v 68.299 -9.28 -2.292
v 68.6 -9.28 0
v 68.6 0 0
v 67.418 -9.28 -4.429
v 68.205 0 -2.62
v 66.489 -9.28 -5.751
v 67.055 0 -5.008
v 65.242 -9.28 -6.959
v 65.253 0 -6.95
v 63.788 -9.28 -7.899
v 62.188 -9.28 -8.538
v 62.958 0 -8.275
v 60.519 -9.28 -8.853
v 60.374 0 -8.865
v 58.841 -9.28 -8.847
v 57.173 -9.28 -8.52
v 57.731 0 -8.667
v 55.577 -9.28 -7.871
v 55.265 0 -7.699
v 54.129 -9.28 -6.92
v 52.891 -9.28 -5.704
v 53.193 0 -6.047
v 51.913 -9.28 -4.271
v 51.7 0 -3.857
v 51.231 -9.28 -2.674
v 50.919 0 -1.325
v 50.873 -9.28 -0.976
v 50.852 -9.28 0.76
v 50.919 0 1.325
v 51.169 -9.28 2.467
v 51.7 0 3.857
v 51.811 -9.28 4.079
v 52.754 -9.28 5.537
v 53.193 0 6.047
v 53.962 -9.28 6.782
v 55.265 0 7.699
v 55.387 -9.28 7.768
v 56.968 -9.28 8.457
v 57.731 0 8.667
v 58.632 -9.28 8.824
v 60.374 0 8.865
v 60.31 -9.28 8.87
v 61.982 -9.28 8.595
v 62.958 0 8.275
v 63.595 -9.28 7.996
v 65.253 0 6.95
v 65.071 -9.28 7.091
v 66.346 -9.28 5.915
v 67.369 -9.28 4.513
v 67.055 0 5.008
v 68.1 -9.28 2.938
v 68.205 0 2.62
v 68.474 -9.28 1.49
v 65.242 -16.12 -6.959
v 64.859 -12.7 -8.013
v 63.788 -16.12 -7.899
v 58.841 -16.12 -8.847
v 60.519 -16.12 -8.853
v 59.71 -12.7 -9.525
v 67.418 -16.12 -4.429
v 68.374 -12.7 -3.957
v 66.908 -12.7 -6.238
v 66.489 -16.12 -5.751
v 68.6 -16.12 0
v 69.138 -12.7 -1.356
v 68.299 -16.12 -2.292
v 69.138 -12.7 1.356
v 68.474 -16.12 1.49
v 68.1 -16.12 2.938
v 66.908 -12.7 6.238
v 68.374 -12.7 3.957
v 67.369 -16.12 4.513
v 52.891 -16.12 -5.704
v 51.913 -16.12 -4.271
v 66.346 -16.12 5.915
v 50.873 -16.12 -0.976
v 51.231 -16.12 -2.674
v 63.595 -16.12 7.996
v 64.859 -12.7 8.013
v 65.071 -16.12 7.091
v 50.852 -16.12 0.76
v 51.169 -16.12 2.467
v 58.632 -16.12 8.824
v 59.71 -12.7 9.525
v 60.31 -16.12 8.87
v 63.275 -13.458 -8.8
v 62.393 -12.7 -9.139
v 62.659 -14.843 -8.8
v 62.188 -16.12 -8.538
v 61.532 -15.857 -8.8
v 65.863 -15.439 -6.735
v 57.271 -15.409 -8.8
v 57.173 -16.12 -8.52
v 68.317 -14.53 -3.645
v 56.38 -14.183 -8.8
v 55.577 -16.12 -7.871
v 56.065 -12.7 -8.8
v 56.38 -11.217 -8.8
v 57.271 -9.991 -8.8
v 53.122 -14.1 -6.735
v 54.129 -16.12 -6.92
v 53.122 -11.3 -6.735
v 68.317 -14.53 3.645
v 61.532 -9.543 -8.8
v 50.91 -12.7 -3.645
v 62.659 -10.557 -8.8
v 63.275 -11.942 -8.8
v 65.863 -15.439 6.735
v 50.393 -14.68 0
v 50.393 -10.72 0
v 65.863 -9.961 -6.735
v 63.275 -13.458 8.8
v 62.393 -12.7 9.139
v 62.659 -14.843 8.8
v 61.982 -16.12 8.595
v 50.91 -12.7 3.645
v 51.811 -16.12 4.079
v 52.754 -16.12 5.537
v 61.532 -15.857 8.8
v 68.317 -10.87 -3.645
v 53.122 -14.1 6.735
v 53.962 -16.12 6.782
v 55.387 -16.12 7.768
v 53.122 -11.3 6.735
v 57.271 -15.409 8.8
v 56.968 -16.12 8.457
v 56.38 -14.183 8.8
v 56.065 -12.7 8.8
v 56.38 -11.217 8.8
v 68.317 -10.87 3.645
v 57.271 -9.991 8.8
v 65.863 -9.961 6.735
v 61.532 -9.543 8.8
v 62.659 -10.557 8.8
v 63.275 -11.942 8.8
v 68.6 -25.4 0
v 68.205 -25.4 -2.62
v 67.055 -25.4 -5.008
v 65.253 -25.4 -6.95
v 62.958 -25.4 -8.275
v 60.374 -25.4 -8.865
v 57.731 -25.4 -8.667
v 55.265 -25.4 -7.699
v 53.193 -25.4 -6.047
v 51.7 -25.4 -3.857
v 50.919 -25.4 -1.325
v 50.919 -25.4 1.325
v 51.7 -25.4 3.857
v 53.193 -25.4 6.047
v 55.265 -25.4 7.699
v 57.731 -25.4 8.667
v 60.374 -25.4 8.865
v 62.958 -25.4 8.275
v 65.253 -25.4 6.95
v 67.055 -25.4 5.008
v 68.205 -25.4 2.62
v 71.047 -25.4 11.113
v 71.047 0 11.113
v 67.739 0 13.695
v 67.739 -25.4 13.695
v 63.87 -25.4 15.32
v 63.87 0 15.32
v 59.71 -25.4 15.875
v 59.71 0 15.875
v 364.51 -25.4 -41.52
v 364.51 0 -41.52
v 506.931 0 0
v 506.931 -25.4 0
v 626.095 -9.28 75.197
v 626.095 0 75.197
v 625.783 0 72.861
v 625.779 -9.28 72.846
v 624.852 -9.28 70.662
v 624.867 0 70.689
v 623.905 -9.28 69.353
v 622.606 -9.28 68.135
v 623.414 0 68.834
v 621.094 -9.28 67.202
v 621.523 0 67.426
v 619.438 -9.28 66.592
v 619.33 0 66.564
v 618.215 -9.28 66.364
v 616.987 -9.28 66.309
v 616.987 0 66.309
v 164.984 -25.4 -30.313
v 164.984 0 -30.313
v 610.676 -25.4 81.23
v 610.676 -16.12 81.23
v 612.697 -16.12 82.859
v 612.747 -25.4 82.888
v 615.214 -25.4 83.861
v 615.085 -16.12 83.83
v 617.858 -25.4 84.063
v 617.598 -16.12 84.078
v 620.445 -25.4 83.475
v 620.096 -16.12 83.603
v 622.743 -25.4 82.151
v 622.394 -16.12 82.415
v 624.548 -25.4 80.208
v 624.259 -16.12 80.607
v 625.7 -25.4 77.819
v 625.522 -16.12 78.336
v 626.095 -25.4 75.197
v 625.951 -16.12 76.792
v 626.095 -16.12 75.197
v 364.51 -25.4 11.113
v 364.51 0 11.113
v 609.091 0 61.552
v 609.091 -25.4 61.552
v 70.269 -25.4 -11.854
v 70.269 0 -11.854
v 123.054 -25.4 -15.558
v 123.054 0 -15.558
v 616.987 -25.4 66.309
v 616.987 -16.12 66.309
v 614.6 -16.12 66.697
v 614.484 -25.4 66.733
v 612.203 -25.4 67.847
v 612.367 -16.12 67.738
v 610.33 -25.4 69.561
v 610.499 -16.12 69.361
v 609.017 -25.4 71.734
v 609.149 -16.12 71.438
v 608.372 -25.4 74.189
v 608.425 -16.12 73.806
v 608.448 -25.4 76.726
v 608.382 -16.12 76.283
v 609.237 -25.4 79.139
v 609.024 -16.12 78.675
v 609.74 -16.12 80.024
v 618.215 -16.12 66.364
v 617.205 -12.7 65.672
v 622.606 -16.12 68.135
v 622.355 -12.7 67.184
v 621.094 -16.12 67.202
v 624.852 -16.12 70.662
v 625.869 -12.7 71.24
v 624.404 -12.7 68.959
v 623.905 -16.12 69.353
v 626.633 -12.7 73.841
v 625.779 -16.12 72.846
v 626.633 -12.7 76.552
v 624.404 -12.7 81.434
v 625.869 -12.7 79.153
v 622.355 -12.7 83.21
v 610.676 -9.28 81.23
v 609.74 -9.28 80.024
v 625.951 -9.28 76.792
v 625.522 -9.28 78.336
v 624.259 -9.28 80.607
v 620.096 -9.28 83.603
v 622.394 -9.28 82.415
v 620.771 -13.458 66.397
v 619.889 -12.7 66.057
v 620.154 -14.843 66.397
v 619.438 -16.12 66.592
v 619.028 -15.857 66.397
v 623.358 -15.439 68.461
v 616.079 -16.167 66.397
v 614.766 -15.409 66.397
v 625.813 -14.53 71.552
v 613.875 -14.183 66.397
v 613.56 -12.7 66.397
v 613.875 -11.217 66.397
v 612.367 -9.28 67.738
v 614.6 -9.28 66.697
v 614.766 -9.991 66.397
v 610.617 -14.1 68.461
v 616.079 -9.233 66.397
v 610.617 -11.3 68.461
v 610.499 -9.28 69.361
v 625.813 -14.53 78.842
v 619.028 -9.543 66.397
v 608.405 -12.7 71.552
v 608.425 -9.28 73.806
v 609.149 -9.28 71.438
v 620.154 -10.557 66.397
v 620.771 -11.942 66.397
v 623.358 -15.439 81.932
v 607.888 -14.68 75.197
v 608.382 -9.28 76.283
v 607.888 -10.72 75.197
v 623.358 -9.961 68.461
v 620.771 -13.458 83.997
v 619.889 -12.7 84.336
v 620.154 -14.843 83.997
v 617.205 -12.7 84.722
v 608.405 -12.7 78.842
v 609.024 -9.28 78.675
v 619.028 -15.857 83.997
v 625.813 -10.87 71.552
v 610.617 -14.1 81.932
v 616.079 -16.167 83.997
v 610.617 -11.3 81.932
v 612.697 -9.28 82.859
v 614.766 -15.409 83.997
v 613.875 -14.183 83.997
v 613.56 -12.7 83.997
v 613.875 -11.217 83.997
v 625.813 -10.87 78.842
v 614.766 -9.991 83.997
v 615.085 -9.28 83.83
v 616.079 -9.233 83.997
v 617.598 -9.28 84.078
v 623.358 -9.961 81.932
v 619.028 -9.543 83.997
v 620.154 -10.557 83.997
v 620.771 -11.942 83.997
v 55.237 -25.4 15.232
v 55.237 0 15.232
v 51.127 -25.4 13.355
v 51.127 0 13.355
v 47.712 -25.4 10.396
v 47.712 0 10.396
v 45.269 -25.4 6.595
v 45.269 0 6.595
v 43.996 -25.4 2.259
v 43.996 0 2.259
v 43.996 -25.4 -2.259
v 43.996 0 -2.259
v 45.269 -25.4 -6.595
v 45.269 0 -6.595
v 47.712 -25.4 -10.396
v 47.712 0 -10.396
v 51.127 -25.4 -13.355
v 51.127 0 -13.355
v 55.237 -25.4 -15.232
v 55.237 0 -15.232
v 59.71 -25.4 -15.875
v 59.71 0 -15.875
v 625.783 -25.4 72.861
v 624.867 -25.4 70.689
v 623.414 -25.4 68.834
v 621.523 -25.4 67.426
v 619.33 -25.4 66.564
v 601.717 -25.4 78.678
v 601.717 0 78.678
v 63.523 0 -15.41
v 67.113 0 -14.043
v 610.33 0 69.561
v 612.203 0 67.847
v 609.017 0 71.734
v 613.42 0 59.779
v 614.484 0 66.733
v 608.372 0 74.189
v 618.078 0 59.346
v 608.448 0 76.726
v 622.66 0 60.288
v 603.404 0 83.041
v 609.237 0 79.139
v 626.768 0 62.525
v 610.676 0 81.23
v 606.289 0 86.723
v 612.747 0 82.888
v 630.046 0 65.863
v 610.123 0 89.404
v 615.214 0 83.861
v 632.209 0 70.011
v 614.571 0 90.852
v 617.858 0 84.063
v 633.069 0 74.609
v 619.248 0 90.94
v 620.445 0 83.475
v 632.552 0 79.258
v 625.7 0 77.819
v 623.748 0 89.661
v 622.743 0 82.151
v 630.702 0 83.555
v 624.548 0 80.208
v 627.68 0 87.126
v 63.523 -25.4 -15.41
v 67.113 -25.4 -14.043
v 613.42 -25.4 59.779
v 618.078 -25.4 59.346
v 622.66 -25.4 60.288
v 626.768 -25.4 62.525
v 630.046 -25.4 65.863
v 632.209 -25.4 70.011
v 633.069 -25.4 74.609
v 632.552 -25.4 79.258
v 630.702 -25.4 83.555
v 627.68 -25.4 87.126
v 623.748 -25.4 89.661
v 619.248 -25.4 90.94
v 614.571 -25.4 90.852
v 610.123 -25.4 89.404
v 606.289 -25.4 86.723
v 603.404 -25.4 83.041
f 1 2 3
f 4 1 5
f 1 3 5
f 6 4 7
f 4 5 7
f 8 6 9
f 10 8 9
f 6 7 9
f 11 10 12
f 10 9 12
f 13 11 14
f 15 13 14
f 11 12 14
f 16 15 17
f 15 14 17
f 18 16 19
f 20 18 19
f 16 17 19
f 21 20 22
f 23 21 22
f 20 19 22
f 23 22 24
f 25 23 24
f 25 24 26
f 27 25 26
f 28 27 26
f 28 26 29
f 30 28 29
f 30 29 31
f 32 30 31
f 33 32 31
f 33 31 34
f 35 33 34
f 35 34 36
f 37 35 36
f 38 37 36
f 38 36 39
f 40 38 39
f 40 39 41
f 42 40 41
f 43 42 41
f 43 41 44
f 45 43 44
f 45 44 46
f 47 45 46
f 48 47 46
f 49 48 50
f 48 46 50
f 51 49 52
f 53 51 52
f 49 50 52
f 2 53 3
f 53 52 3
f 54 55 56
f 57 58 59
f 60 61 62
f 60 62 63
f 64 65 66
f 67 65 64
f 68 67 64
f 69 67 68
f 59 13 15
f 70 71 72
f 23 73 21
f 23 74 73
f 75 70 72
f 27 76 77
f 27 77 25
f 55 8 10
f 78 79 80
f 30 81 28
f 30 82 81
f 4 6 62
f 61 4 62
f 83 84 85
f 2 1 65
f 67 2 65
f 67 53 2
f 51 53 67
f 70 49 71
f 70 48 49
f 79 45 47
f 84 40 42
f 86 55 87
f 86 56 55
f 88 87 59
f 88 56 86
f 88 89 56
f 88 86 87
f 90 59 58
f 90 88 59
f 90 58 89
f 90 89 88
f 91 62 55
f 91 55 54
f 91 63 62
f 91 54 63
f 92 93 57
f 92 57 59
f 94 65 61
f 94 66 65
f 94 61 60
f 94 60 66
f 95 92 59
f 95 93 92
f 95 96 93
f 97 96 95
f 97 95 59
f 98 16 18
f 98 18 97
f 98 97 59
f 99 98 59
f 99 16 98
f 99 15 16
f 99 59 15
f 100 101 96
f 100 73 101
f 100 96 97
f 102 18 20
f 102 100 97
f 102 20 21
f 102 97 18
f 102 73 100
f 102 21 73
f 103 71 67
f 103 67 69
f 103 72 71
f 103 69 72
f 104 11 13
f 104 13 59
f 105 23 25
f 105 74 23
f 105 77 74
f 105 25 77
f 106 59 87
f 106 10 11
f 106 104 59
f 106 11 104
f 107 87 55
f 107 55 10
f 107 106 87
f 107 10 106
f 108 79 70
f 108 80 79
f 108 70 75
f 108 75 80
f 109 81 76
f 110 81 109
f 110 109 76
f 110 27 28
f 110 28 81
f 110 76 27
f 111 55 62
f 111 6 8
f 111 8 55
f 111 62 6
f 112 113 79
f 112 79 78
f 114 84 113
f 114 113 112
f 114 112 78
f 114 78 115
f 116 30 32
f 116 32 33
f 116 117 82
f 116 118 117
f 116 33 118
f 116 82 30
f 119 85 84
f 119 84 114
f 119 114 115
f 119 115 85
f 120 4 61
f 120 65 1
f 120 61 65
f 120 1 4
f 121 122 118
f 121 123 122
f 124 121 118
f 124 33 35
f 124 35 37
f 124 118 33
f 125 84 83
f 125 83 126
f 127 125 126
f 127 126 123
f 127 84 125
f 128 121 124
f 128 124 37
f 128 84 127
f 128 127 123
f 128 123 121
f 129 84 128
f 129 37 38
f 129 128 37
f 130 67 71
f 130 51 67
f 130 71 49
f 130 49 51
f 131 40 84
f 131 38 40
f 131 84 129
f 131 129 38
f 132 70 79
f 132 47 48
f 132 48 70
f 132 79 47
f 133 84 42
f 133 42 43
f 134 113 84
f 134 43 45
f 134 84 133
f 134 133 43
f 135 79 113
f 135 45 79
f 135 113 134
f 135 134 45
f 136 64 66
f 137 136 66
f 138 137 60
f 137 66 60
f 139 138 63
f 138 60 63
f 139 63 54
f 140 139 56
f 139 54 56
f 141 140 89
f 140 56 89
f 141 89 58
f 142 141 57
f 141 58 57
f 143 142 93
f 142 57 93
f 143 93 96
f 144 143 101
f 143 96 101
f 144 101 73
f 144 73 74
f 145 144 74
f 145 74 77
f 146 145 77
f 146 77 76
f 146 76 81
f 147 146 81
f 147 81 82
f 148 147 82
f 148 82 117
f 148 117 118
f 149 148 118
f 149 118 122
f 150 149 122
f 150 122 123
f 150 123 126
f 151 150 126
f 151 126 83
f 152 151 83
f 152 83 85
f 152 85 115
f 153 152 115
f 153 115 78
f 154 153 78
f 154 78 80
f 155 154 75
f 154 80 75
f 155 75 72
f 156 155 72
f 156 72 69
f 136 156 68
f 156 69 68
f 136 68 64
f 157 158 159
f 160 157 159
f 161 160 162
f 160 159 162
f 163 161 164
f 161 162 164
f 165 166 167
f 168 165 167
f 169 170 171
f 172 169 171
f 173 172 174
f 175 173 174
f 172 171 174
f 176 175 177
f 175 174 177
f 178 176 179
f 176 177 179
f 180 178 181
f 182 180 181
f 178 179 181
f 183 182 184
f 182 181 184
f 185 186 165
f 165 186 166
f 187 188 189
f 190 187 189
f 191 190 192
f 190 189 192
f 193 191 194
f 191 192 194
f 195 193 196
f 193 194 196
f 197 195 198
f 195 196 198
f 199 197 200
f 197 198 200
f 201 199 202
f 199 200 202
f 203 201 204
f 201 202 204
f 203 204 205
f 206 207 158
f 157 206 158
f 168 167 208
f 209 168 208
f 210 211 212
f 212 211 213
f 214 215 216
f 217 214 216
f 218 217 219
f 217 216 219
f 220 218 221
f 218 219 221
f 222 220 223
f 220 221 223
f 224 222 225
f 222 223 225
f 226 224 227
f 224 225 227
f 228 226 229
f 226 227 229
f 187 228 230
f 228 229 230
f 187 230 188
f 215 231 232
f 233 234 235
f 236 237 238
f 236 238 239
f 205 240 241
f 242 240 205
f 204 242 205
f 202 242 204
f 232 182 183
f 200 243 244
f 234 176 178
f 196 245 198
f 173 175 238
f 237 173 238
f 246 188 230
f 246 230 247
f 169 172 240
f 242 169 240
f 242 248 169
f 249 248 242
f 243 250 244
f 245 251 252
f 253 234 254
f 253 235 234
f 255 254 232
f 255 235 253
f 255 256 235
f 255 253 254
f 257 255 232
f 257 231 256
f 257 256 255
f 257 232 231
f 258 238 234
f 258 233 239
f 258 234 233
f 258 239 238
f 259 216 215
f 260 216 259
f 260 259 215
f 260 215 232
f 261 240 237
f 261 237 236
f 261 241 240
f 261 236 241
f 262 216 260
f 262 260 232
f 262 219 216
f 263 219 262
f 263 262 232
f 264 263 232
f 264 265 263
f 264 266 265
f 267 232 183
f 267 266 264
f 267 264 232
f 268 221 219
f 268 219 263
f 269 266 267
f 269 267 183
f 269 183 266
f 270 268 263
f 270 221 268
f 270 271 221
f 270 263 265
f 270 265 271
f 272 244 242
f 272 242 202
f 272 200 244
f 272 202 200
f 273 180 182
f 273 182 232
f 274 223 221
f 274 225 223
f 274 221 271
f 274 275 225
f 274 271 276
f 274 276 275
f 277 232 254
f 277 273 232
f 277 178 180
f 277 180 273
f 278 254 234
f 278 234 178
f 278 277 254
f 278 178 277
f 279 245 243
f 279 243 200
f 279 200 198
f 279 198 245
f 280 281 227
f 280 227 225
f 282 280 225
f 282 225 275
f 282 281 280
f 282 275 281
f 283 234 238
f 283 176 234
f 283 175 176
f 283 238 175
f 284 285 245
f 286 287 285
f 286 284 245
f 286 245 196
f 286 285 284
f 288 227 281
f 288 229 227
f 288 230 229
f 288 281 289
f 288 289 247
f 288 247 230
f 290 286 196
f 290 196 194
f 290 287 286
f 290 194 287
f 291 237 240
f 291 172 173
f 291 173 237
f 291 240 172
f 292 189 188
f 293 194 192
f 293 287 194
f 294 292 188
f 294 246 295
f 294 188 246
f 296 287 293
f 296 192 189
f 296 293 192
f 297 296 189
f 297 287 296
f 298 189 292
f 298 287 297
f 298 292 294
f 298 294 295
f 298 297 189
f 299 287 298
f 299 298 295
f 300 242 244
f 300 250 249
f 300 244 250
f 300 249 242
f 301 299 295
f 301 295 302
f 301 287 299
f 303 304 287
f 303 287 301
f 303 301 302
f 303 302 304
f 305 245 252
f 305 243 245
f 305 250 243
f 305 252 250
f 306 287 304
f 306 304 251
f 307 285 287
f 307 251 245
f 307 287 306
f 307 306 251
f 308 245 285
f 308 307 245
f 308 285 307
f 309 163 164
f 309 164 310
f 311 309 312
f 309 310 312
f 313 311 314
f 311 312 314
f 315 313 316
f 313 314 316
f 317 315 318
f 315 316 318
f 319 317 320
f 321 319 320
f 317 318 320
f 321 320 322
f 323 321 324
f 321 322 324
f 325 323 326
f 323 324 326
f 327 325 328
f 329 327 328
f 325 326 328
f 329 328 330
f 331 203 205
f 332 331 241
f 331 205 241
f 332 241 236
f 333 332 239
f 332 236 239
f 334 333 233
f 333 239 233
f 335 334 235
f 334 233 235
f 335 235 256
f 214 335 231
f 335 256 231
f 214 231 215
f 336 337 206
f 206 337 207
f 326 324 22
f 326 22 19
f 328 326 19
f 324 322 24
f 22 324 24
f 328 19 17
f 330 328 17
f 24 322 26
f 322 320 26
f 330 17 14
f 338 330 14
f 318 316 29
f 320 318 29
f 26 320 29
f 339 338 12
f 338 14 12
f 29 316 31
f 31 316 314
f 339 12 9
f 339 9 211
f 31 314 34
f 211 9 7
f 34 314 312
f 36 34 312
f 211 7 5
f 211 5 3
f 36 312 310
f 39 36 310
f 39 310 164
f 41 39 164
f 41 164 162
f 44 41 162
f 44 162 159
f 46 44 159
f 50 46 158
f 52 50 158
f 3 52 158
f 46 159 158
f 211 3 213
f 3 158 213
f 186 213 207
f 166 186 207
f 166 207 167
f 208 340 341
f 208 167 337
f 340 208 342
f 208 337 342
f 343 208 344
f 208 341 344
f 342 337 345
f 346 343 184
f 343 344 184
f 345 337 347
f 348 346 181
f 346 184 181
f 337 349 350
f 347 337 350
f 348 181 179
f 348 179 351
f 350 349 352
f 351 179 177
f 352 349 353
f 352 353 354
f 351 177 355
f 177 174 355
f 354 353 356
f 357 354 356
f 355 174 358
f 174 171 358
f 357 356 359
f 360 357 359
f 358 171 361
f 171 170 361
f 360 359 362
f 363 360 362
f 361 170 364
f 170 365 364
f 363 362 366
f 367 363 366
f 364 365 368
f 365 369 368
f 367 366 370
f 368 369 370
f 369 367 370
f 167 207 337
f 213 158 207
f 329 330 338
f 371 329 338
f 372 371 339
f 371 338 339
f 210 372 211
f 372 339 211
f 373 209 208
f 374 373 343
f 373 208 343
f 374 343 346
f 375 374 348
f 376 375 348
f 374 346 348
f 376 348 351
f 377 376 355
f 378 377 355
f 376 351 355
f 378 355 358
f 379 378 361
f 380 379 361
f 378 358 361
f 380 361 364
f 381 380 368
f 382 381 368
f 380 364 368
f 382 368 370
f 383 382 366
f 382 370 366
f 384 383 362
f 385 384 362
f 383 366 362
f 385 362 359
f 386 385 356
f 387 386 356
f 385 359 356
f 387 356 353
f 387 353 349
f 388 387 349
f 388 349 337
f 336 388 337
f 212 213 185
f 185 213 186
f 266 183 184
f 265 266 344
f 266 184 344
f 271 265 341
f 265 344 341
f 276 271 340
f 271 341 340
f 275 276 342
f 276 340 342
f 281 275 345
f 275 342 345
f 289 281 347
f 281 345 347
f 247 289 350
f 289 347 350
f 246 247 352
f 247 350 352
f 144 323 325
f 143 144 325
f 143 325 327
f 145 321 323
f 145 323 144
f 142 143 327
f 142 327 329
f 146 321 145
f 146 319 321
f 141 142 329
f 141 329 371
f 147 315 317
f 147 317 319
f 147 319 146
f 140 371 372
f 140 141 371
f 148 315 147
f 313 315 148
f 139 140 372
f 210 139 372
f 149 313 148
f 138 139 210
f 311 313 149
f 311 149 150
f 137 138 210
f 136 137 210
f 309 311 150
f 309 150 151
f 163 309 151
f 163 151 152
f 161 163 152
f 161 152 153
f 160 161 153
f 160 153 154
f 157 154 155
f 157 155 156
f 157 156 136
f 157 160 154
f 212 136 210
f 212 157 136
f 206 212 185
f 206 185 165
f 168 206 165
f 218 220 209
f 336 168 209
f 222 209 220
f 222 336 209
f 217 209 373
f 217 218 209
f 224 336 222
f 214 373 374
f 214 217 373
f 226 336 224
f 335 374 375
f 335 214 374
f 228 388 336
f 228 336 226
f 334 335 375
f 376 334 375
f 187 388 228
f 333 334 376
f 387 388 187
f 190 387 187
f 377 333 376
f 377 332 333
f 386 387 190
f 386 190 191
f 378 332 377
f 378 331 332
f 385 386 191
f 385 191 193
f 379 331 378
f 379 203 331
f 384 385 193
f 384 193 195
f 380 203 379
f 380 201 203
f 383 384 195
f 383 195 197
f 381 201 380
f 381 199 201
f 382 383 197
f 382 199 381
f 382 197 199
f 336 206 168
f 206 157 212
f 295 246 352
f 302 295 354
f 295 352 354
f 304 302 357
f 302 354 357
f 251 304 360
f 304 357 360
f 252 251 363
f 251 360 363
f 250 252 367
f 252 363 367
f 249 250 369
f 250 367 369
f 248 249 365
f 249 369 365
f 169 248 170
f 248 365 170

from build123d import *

# Parameters (mm, degrees)
F1_DEPTH = 25.4


with BuildPart() as f1:
    # F0 (on Front) → F1 (new body)
    with BuildSketch(Plane.XZ):
        with BuildLine():
            ThreePointArc((75.5846782372, 0), (74.4064598557, 6.0016860181), (71.0466958676, 11.1125))
            Line((71.0466958676, 11.1125), (59.7096782372, 11.1125))
            Line((59.7096782372, 11.1125), (59.7096782372, 8.89))
            ThreePointArc((59.7096782372, 8.89), (65.995857522, 6.2861792847), (68.5996782372, 0))
            ThreePointArc((68.5996782372, 0), (65.995857522, -6.2861792847), (59.7096782372, -8.89))
            Line((59.7096782372, -8.89), (59.7096782372, -11.1125))
            Line((59.7096782372, -11.1125), (70.2693648091, -11.8536342319))
            ThreePointArc((70.2693648091, -11.8536342319), (74.195026858, -6.4954060948), (75.5846782372, 0))
        make_face()
        with BuildLine():
            ThreePointArc((71.0466958676, 11.1125), (65.8580392994, 14.636026826), (59.7096782372, 15.875))
            Line((59.7096782372, 15.875), (59.7096782372, 11.1125))
            Line((59.7096782372, 11.1125), (71.0466958676, 11.1125))
        make_face()
        with BuildLine():
            Line((59.7096782372, 11.1125), (59.7096782372, 15.875))
            ThreePointArc((59.7096782372, 15.875), (43.8346782372, 0), (59.7096782372, -15.875))
            Line((59.7096782372, -15.875), (59.7096782372, -11.1125))
            Line((59.7096782372, -11.1125), (59.7096782372, -8.89))
            ThreePointArc((59.7096782372, -8.89), (50.8196782372, 0), (59.7096782372, 8.89))
            Line((59.7096782372, 8.89), (59.7096782372, 11.1125))
        make_face()
        with BuildLine():
            Line((59.7096782372, -11.1125), (59.7096782372, -15.875))
            ThreePointArc((59.7096782372, -15.875), (65.3594207786, -14.8356339337), (70.2693648091, -11.8536342319))
            Line((70.2693648091, -11.8536342319), (59.7096782372, -11.1125))
        make_face()
        with BuildLine():
            Line((364.5096782372, 11.1125), (71.0466958676, 11.1125))
            ThreePointArc((71.0466958676, 11.1125), (74.4064598557, 6.0016860181), (75.5846782372, 0))
            ThreePointArc((75.5846782372, 0), (74.195026858, -6.4954060948), (70.2693648091, -11.8536342319))
            Line((70.2693648091, -11.8536342319), (123.0538541683, -15.5583267636))
            Line((123.0538541683, -15.5583267636), (164.9836269965, -30.31287354))
            Line((164.9836269965, -30.31287354), (364.5096782372, -41.5203937454))
            Line((364.5096782372, -41.5203937454), (364.5096782372, 11.1125))
        make_face()
        with BuildLine():
            Line((528.8047229938, 57.9100469965), (364.5096782372, 11.1125))
            Line((364.5096782372, 11.1125), (364.5096782372, -41.5203937454))
            Line((364.5096782372, -41.5203937454), (506.9307684898, 0))
            Line((506.9307684898, 0), (609.0909272925, 61.5520499979))
            ThreePointArc((609.0909272925, 61.5520499979), (602.6243965326, 68.918336487), (601.716619668, 78.6781591222))
            Line((601.716619668, 78.6781591222), (528.8047229938, 57.9100469965))
        make_face()
        with BuildLine():
            Line((610.6760785802, 81.2301575719), (601.716619668, 78.6781591222))
            ThreePointArc((601.716619668, 78.6781591222), (602.6243965326, 68.918336487), (609.0909272925, 61.5520499979))
            Line((609.0909272925, 61.5520499979), (616.9867526025, 66.3093275899))
            ThreePointArc((616.9867526025, 66.3093275899), (609.017363859, 71.7336687669), (610.6760785802, 81.2301575719))
        make_face()
        with BuildLine():
            ThreePointArc((633.0801535113, 75.196644454), (618.956602945, 90.9747321037), (601.716619668, 78.6781591222))
            Line((601.716619668, 78.6781591222), (610.6760785802, 81.2301575719))
            ThreePointArc((610.6760785802, 81.2301575719), (620.4446460535, 83.4753996786), (626.0951535113, 75.196644454))
            ThreePointArc((626.0951535113, 75.196644454), (623.4136362535, 68.8337172943), (616.9867526025, 66.3093275899))
            Line((616.9867526025, 66.3093275899), (609.0909272925, 61.5520499979))
            ThreePointArc((609.0909272925, 61.5520499979), (625.0537930041, 61.3975690099), (633.0801535113, 75.196644454))
        make_face()
    extrude(amount=F1_DEPTH)

    # F3 (on offset) → F4 (revolve, cut)
    with BuildSketch(Plane.XZ.offset(12.7)):
        with BuildLine():
            Line((59.7096782372, 0), (59.7096782372, -9.525))
            ThreePointArc((59.7096782372, -9.525), (69.2346782372, 0), (59.7096782372, 9.525))
            Line((59.7096782372, 9.525), (59.7096782372, 0))
        make_face()
    revolve(axis=Axis((59.7096782372, -12.7, 0), (0, 0, -1)), mode=Mode.SUBTRACT)

    # F3 (on offset) → F5 (revolve, cut)
    with BuildSketch(Plane.XZ.offset(12.7)):
        with BuildLine():
            Line((617.2051535113, 75.196644454), (617.2051535113, 65.671644454))
            ThreePointArc((617.2051535113, 65.671644454), (626.7301535113, 75.196644454), (617.2051535113, 84.721644454))
            Line((617.2051535113, 84.721644454), (617.2051535113, 75.196644454))
        make_face()
    revolve(axis=Axis((617.2051535113, -12.7, 75.196644454), (0, 0, -1)), mode=Mode.SUBTRACT)


solid = f1.part
